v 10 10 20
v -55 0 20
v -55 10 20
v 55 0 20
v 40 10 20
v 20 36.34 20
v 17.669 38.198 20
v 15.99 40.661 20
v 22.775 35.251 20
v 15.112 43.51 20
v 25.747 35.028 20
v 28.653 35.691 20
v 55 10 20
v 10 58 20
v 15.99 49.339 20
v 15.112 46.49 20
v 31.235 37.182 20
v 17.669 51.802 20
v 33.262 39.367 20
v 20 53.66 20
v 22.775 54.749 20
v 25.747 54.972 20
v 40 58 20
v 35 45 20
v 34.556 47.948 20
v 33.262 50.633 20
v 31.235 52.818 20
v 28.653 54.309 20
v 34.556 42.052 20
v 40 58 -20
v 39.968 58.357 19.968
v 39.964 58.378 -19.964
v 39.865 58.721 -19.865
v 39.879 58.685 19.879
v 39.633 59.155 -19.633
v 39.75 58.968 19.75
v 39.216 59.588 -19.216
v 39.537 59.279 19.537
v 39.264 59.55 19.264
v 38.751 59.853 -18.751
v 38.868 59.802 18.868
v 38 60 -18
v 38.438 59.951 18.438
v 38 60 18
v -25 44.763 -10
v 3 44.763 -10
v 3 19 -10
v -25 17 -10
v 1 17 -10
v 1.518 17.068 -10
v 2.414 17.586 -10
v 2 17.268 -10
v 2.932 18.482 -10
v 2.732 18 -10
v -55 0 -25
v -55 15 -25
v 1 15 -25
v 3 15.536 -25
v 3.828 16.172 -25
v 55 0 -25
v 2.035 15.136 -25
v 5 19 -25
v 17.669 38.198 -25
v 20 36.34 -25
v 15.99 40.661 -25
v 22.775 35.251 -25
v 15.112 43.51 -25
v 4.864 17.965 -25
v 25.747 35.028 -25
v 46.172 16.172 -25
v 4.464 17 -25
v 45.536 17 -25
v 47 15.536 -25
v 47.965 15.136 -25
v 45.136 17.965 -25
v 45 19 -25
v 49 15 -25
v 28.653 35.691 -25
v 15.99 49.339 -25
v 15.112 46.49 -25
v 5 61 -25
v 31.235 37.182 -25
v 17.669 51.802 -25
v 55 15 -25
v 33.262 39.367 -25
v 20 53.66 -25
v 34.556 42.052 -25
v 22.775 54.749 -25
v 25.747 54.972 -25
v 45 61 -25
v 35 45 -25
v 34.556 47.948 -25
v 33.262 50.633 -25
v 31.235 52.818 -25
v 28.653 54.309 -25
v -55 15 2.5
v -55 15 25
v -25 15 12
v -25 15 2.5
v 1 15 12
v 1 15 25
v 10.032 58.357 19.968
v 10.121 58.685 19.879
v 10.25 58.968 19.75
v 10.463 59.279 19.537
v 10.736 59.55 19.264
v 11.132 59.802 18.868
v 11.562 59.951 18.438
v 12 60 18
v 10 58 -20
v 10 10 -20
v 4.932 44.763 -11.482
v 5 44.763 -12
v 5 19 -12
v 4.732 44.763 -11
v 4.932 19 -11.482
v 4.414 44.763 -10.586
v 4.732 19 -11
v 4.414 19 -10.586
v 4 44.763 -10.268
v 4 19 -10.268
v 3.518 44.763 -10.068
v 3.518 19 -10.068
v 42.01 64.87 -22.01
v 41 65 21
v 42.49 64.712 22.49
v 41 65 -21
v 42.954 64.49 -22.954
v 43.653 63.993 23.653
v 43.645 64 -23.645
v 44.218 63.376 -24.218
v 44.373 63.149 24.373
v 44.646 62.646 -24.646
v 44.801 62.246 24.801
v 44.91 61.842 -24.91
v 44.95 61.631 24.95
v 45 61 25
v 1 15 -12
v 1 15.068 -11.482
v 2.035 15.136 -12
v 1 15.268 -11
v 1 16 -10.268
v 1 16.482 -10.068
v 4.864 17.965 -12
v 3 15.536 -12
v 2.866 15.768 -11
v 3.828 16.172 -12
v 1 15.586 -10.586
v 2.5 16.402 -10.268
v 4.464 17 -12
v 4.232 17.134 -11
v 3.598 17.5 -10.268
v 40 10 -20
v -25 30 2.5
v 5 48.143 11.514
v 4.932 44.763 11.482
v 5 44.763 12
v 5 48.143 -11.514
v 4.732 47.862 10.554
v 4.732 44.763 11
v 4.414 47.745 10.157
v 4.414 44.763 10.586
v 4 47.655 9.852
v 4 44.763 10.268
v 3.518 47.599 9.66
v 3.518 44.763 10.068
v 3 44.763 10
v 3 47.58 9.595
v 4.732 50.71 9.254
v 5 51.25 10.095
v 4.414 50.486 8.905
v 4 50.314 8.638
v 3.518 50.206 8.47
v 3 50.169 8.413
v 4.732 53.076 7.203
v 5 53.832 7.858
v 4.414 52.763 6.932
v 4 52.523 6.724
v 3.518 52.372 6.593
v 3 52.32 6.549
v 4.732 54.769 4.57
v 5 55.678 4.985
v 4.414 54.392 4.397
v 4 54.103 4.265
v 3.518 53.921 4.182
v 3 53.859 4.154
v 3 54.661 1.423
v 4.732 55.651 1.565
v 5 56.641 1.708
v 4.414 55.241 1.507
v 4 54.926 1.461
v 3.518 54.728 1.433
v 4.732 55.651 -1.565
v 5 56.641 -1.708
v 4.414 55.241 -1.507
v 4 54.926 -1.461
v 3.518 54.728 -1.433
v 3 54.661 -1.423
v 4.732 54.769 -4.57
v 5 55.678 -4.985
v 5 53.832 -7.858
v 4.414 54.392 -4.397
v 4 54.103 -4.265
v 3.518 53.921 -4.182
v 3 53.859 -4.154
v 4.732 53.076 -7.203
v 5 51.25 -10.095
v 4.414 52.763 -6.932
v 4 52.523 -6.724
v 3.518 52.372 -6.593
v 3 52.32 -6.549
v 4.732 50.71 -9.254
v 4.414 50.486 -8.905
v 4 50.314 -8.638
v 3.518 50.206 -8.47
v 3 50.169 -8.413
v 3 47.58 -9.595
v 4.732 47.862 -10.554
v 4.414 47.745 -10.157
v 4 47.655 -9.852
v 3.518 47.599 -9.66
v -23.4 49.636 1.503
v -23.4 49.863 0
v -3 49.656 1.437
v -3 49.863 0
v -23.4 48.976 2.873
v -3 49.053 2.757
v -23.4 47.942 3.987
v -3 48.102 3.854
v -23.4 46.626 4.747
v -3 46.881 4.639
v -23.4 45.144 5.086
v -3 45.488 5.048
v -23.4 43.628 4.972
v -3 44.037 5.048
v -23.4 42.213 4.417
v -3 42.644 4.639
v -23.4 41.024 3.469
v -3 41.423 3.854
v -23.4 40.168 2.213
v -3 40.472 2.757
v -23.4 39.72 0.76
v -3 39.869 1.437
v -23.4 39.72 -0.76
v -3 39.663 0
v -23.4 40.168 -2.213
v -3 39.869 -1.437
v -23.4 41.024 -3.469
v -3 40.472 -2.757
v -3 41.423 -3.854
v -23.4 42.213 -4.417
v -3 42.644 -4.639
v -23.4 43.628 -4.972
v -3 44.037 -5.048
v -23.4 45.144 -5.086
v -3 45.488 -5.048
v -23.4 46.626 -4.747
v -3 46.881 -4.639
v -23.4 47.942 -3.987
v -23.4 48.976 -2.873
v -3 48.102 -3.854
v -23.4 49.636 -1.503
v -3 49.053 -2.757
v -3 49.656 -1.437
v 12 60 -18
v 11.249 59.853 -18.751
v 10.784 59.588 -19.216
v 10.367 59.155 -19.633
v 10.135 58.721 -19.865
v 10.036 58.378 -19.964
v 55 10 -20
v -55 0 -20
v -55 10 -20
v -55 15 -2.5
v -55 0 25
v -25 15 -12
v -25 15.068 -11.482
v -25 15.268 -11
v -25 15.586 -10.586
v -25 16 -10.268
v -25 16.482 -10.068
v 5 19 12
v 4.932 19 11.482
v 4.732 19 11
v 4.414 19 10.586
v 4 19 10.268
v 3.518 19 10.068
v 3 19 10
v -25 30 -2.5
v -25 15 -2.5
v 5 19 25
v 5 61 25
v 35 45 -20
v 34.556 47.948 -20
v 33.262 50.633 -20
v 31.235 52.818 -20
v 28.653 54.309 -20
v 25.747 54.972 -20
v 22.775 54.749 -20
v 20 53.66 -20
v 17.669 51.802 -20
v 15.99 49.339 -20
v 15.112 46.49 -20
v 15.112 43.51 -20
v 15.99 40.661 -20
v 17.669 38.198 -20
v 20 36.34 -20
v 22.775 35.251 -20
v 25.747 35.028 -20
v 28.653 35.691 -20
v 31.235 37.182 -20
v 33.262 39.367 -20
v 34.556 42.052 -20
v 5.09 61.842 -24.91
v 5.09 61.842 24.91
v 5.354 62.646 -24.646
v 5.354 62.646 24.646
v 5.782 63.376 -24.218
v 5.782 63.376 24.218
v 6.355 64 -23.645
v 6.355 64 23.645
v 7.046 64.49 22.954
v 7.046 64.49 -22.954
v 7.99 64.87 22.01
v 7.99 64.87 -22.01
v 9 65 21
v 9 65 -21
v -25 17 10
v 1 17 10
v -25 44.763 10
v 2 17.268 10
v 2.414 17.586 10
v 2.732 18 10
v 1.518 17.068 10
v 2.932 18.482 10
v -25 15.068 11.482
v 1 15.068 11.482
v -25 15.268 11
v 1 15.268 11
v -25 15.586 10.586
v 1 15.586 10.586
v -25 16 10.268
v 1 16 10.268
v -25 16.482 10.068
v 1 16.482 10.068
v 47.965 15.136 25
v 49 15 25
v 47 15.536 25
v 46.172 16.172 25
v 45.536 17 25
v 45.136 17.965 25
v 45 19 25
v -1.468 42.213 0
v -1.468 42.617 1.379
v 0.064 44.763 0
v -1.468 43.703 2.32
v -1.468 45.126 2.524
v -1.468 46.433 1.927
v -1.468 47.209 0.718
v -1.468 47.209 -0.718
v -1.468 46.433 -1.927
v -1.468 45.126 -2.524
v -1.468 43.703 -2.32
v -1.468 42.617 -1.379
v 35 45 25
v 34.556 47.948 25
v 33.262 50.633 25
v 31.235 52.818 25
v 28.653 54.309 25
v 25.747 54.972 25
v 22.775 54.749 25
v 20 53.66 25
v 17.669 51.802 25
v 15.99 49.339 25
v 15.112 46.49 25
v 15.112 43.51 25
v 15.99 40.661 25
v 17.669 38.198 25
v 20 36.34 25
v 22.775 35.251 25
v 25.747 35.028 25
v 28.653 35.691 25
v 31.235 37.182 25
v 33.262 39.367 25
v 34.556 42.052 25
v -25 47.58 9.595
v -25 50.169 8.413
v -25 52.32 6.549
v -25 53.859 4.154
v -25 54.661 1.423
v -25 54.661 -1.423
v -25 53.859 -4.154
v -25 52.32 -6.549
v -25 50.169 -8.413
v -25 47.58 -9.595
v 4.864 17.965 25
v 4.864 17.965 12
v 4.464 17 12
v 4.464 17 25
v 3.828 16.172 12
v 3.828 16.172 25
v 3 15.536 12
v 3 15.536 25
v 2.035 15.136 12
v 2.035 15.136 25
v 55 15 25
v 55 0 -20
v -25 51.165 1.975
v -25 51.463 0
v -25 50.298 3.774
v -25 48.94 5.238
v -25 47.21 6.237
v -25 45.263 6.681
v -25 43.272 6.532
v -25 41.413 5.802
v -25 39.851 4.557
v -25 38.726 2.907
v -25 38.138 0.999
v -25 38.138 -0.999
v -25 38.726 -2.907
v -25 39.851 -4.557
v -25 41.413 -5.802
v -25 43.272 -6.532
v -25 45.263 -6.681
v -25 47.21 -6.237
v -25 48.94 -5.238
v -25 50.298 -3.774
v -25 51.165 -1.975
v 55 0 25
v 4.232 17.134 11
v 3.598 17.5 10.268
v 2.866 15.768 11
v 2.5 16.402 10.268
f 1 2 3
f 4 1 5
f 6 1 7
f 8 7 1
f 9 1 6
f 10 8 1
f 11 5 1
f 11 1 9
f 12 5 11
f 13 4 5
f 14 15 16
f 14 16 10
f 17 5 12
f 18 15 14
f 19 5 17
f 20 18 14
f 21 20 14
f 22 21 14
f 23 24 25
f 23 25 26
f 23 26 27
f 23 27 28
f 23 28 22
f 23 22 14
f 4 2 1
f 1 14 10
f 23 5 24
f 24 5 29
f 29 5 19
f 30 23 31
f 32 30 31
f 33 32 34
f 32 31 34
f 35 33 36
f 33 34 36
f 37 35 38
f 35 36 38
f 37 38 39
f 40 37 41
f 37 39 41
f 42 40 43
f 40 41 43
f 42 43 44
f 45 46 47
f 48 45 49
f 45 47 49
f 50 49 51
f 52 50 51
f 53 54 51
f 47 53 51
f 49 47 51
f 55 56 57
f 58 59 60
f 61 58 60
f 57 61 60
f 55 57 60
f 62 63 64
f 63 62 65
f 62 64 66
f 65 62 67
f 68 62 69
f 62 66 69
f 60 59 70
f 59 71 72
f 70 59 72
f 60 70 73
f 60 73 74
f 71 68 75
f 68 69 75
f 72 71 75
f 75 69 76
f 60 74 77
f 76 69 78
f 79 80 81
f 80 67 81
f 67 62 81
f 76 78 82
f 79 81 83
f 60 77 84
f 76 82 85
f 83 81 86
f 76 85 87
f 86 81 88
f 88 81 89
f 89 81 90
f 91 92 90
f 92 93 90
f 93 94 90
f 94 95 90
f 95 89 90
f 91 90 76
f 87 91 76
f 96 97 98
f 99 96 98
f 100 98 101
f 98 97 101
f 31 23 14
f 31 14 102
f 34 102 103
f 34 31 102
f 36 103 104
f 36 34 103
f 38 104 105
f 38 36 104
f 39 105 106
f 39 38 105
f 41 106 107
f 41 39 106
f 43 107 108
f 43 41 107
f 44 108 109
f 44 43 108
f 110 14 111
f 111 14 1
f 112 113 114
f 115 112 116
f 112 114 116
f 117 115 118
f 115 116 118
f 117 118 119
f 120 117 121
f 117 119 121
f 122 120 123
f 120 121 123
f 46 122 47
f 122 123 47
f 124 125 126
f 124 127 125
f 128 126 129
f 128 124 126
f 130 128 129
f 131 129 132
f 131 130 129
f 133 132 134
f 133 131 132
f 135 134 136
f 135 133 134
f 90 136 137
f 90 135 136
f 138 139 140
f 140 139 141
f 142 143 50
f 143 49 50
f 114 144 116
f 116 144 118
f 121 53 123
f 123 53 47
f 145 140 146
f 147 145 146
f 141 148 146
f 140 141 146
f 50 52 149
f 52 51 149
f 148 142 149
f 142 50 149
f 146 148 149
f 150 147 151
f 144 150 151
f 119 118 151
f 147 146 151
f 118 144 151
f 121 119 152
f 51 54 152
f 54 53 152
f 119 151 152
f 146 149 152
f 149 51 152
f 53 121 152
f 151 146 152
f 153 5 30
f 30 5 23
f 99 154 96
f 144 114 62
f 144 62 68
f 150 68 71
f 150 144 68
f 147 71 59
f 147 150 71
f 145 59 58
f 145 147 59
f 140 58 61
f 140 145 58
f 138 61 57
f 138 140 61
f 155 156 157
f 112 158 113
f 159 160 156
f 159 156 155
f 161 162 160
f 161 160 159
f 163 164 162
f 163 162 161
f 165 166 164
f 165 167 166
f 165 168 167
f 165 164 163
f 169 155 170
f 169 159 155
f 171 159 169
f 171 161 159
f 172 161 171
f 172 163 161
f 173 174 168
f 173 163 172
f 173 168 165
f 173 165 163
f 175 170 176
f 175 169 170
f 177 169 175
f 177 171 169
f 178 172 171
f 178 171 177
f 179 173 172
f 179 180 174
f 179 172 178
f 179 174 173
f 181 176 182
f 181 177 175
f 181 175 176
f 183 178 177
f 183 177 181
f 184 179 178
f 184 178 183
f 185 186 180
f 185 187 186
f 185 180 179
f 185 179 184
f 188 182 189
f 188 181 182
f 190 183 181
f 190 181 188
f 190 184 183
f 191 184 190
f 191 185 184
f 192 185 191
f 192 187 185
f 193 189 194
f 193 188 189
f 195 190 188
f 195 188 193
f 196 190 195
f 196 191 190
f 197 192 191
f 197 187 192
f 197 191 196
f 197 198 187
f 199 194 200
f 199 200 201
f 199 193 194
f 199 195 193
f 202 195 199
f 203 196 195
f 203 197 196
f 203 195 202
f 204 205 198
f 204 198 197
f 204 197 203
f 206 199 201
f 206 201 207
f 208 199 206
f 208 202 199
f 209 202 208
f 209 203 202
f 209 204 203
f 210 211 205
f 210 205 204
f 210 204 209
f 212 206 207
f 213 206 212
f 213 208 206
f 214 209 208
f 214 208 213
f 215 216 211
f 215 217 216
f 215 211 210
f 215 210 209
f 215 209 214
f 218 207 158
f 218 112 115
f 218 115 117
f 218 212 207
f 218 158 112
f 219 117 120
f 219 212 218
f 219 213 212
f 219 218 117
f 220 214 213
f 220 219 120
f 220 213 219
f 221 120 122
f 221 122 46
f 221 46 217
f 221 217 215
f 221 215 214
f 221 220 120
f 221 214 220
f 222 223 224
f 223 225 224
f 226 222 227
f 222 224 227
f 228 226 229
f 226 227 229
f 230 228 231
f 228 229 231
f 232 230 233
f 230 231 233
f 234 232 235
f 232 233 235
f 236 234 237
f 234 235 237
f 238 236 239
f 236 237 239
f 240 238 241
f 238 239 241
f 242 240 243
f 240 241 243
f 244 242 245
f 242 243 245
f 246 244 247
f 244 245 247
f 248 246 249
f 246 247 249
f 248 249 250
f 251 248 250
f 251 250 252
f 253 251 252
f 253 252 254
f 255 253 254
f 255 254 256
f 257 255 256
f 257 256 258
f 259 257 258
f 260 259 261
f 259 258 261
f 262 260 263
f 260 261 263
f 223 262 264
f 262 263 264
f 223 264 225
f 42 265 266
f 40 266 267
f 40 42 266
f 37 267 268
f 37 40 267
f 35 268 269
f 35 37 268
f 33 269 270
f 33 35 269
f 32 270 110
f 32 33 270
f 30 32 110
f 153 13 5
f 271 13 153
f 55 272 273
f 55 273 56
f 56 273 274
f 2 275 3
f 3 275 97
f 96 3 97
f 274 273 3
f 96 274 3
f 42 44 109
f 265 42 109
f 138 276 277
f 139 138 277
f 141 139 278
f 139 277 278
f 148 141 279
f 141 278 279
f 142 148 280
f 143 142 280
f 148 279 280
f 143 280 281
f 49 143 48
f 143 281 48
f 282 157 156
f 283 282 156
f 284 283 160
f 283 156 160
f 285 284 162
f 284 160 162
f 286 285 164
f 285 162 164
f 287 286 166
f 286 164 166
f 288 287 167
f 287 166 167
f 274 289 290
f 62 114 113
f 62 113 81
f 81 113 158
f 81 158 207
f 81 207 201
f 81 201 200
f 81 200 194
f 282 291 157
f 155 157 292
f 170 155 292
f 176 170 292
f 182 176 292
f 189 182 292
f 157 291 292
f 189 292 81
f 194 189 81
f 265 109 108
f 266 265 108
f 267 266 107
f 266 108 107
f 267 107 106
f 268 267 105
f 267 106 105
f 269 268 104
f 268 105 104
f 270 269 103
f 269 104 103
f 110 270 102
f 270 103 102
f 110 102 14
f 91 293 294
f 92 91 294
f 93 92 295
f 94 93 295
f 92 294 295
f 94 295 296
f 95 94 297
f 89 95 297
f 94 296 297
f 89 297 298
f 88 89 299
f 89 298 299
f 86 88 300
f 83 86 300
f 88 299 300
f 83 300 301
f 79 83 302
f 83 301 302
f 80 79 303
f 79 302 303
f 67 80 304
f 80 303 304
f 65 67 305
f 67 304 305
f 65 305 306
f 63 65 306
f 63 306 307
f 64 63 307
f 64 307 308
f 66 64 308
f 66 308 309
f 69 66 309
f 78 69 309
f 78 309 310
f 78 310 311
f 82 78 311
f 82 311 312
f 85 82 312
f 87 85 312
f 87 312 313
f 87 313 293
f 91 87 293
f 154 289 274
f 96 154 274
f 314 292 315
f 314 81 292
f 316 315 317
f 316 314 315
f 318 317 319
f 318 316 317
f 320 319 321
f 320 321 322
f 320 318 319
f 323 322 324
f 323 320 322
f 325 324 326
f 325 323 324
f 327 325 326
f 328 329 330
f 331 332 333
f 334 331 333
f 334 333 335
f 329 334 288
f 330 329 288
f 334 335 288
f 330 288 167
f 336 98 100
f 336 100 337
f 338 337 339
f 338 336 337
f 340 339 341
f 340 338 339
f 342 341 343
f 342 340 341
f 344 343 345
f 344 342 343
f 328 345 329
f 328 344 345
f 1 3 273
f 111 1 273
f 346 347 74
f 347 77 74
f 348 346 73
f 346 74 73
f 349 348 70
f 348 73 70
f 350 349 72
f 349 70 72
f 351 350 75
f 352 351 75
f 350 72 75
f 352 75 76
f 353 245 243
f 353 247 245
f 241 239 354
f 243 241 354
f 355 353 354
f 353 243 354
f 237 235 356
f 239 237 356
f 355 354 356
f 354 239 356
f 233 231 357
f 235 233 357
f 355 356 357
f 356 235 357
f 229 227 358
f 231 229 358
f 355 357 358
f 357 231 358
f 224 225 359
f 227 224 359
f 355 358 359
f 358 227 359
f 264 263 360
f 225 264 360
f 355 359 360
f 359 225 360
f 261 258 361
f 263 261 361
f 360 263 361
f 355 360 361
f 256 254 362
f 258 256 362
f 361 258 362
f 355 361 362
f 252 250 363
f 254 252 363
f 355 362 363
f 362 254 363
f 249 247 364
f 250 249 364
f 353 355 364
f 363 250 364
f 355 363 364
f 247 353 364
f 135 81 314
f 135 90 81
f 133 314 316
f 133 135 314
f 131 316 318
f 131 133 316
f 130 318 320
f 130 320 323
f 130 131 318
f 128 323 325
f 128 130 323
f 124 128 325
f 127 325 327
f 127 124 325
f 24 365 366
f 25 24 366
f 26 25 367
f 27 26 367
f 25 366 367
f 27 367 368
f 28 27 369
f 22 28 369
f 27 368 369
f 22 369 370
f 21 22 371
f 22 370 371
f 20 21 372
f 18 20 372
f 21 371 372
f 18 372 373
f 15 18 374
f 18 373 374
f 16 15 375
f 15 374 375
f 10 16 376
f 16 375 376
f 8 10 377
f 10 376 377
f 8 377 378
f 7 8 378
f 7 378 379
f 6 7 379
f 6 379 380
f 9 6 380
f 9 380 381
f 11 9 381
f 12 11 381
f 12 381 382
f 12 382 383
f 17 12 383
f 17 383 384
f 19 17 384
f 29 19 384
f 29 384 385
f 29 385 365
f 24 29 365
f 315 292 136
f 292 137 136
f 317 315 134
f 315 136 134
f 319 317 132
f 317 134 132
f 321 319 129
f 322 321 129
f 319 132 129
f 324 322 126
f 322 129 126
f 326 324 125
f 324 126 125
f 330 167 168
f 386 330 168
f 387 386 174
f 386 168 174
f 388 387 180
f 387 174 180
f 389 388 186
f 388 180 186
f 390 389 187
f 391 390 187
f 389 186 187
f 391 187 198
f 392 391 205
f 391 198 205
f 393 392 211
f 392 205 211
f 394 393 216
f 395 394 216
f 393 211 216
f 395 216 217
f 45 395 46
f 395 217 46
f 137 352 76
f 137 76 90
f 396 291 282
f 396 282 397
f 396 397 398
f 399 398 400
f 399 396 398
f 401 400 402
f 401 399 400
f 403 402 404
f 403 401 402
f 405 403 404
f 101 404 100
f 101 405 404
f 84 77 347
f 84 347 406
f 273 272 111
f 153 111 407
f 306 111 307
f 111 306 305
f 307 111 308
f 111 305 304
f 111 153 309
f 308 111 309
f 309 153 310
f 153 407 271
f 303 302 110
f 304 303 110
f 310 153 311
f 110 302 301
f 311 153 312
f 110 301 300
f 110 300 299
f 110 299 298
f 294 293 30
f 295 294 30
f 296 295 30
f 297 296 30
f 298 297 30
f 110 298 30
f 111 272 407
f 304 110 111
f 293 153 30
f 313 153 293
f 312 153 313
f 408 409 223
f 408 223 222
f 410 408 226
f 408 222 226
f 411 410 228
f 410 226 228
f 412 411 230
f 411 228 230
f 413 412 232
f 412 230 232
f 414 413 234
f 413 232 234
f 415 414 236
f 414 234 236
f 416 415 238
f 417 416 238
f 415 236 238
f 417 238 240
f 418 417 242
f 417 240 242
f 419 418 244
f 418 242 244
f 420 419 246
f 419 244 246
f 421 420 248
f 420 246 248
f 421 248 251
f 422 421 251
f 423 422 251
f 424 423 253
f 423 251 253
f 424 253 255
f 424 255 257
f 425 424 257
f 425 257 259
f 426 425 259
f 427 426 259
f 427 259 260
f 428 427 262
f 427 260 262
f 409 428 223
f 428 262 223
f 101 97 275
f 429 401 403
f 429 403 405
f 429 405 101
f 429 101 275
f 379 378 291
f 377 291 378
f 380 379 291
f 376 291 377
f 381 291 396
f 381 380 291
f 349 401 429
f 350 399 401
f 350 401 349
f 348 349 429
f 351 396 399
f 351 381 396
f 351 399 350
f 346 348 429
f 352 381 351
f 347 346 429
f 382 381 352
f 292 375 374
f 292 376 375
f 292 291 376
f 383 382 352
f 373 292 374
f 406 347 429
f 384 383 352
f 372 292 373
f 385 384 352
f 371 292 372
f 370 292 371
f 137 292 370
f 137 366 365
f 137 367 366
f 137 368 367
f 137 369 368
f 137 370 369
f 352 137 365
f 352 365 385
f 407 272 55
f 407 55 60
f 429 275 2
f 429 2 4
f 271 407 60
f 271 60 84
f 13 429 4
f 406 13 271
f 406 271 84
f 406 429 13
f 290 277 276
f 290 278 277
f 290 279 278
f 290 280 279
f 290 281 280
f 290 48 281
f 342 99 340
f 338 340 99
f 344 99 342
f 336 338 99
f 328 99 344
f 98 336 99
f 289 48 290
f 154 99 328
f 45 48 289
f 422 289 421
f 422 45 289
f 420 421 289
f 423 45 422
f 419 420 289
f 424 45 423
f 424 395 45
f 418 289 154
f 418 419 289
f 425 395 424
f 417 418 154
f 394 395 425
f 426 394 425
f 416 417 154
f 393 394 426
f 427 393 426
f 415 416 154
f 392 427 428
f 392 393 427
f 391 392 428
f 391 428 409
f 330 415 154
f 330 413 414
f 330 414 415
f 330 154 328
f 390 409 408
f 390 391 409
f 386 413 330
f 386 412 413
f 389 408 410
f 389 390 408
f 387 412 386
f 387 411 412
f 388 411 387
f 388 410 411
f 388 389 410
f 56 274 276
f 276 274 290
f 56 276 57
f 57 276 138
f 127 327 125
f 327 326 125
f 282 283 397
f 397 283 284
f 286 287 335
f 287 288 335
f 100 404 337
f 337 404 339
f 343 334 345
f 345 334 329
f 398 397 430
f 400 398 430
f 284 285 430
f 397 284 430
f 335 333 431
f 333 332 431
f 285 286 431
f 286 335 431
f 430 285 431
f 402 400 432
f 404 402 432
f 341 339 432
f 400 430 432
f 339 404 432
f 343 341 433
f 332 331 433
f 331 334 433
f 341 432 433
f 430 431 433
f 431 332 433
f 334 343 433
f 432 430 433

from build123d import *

# Parameters (mm, degrees)
SKETCH1_W                         = 110
SKETCH1_H                         = 15
BOSS_EXTRUDE1_DEPTH               = 25
SKETCH2_W                         = 40
SKETCH2_H                         = 10
CUT_EXTRUDE1_DEPTH                = 114.798066767
SKETCH3_W                         = 40
SKETCH3_H                         = 50
SKETCH3_R                         = 10
BOSS_EXTRUDE2_DEPTH               = 50
FILLET1_R                         = 4
CUT_EXTRUDE2_DEPTH                = 20
FILLET2_R                         = 2
BOSS_EXTRUDE3_DEPTH               = 30
RIB2_REACH                        = 90.741
SKETCH7_WALL_W                    = 213.023413156
SKETCH7_WALL_H                    = 5
FILLET3_R                         = 2
FILLET4_R                         = 4
TAP_DRILL_FOR_M12X1_75_TAP1_D     = 10.2
TAP_DRILL_FOR_M12X1_75_TAP1_DEPTH = 22
TAP_DRILL_FOR_M12X1_75_TAP1_TIP   = 3.064389157


with BuildPart() as part:
    # Sketch1 → Boss-Extrude1 (new, symmetric)
    with BuildSketch(Plane.XY):
        with Locations((0, 7.5)):
            Rectangle(SKETCH1_W, SKETCH1_H)
    extrude(amount=BOSS_EXTRUDE1_DEPTH, both=True)

    # Sketch2 → Cut-Extrude1 (cut, through all)
    with BuildSketch(Plane(origin=(55, 0, 0), x_dir=(0, 0, -1), z_dir=(1, 0, 0))):
        with Locations((0, 5)):
            Rectangle(SKETCH2_W, SKETCH2_H)
    extrude(amount=-CUT_EXTRUDE1_DEPTH, mode=Mode.SUBTRACT)

    # Sketch3 → Boss-Extrude2 (add)
    with BuildSketch(Plane.XY.offset(25)):
        with Locations((25, 40)):
            Rectangle(SKETCH3_W, SKETCH3_H)
        with Locations((25, 45)):
            Circle(SKETCH3_R, mode=Mode.SUBTRACT)
    extrude(amount=-BOSS_EXTRUDE2_DEPTH)

    # Fillet1
    fillet1_edges = [part.edges().sort_by_distance(p)[0] for p in [
        (25, 65, -25),
        (5, 65, 0),
        (45, 65, 0),
        (45, 15, 0),
        (25, 65, 25),
    ]]
    fillet(fillet1_edges, radius=FILLET1_R)

    # Sketch5 → Cut-Extrude2 (cut, symmetric)
    with BuildSketch(Plane.XY):
        with BuildLine():
            Line((10, 10), (40, 10))
            Line((40, 10), (40, 58))
            ThreePointArc((40, 58), (39.414213562, 59.414213562), (38, 60))
            Line((38, 60), (12, 60))
            ThreePointArc((12, 60), (10.585786438, 59.414213562), (10, 58))
            Line((10, 58), (10, 10))
        make_face()
    extrude(amount=CUT_EXTRUDE2_DEPTH, both=True, mode=Mode.SUBTRACT)

    # Fillet2
    # the kernel refuses this fillet: 2 mm, written as the material it adds along each edge
    with BuildSketch(Plane(origin=(43, 60, 20), x_dir=(0, -1, 0), z_dir=(-1, 0, 0))) as fillet2_piece_1:
        with BuildLine():
            CenterArc((FILLET2_R, -FILLET2_R), FILLET2_R, 90, 90)
            Line((0, -FILLET2_R), (0, 0))
            Line((0, 0), (FILLET2_R, 0))
        make_face()
    extrude(amount=36)
    with BuildSketch(Plane(origin=(43, 60, -20), x_dir=(0, -1, 0), z_dir=(-1, 0, 0))) as fillet2_piece_2:
        with BuildLine():
            CenterArc((FILLET2_R, FILLET2_R), FILLET2_R, 180, 90)
            Line((0, FILLET2_R), (0, 0))
            Line((0, 0), (FILLET2_R, 0))
        make_face()
    extrude(amount=36)

    # Sketch6 → Boss-Extrude3 (add)
    with BuildSketch(Plane.ZY.offset(-5)):
        with BuildLine():
            Line((-10, 15), (10, 15))
            Line((10, 15), (10, 44.76267782))
            ThreePointArc((10, 44.76267782), (0, 54.76267782), (-10, 44.76267782))
            Line((-10, 44.76267782), (-10, 15))
        make_face()
    extrude(amount=BOSS_EXTRUDE3_DEPTH)

    # Sketch7 wall → Rib2 (add, up to next)
    with BuildSketch(Plane(origin=(-40, 22.5, 0), x_dir=(-0.894427191, -0.4472135955, 0), z_dir=(0.4472135955, -0.894427191, 0)), mode=Mode.PRIVATE) as rib2_sk1:
        Rectangle(SKETCH7_WALL_W, SKETCH7_WALL_H)
    rib2_tool1 = extrude(rib2_sk1.sketch, amount=RIB2_REACH, mode=Mode.PRIVATE) - part.part
    add(rib2_tool1.solids().sort_by_distance((-40, 22.5, 0))[0])

    # Fillet3
    fillet3_edges = [part.edges().sort_by_distance(p)[0] for p in [
        (5, 29.88133891, -10),
        (-10, 15, -10),
        (5, 29.88133891, 10),
        (-10, 15, 10),
        (5, 54.76267782, 0),
    ]]
    fillet(fillet3_edges, radius=FILLET3_R)

    # Fillet4
    # the kernel refuses this fillet: 4 mm, written as the material it adds along each edge
    with BuildSketch(Plane(origin=(1, 19, -10), x_dir=(0, -1, 0), z_dir=(-1, 0, 0))) as fillet4_piece_1:
        with BuildLine():
            CenterArc((2, -2), 2, 0, 90)
            Line((4, -2), (4, 0))
            Line((4, 0), (2, 0))
        make_face()
    revolve(axis=Axis((1, 19, -10), (0, 0, 1)), revolution_arc=90)
    with BuildSketch(Plane(origin=(1, 19, 10), x_dir=(1, 0, 0), z_dir=(0, 1, 0))) as fillet4_piece_2:
        with BuildLine():
            CenterArc((2, -2), 2, 0, 90)
            Line((4, -2), (4, 0))
            Line((4, 0), (2, 0))
        make_face()
    revolve(axis=Axis((1, 19, 10), (0, 0, -1)), revolution_arc=90)
    with BuildSketch(Plane(origin=(5, 15, 25), x_dir=(-1, 0, 0), z_dir=(0, 0, -1)), Plane(origin=(5, 15, -10), x_dir=(-1, 0, 0), z_dir=(0, 0, -1))) as fillet4_piece_3:
        with BuildLine():
            CenterArc((FILLET4_R, FILLET4_R), FILLET4_R, 180, 90)
            Line((0, FILLET4_R), (0, 0))
            Line((0, 0), (FILLET4_R, 0))
        make_face()
    extrude(amount=15)

    # Tap Drill for M12x1.75 Tap1
    with Locations(Plane(origin=(-25, 44.76267782, 0), x_dir=(0, -1, 0), z_dir=(-1, 0, 0))):
        with Locations((0, 0)):
            Hole(TAP_DRILL_FOR_M12X1_75_TAP1_D / 2, depth=TAP_DRILL_FOR_M12X1_75_TAP1_DEPTH)
            with Locations((0, 0, -(TAP_DRILL_FOR_M12X1_75_TAP1_DEPTH + TAP_DRILL_FOR_M12X1_75_TAP1_TIP / 2))):  # 118° drill point
                Cone(0, TAP_DRILL_FOR_M12X1_75_TAP1_D / 2, TAP_DRILL_FOR_M12X1_75_TAP1_TIP, mode=Mode.SUBTRACT)

    # Chamfer3: read off the stored shape, not the designer's step
    # Chamfer3 outline → Chamfer3 (revolve, cut)
    with BuildSketch(Plane(origin=(0, 44.76267782, 0), x_dir=(0, 1, 0), z_dir=(0, 0, -1))):
        Polygon((6.7, -25), (5.1, -23.4), (5.1, -25), align=None)
    revolve(axis=Axis((0, 44.76267782, 0), (1, 0, 0)), mode=Mode.SUBTRACT)


solid = part.part
